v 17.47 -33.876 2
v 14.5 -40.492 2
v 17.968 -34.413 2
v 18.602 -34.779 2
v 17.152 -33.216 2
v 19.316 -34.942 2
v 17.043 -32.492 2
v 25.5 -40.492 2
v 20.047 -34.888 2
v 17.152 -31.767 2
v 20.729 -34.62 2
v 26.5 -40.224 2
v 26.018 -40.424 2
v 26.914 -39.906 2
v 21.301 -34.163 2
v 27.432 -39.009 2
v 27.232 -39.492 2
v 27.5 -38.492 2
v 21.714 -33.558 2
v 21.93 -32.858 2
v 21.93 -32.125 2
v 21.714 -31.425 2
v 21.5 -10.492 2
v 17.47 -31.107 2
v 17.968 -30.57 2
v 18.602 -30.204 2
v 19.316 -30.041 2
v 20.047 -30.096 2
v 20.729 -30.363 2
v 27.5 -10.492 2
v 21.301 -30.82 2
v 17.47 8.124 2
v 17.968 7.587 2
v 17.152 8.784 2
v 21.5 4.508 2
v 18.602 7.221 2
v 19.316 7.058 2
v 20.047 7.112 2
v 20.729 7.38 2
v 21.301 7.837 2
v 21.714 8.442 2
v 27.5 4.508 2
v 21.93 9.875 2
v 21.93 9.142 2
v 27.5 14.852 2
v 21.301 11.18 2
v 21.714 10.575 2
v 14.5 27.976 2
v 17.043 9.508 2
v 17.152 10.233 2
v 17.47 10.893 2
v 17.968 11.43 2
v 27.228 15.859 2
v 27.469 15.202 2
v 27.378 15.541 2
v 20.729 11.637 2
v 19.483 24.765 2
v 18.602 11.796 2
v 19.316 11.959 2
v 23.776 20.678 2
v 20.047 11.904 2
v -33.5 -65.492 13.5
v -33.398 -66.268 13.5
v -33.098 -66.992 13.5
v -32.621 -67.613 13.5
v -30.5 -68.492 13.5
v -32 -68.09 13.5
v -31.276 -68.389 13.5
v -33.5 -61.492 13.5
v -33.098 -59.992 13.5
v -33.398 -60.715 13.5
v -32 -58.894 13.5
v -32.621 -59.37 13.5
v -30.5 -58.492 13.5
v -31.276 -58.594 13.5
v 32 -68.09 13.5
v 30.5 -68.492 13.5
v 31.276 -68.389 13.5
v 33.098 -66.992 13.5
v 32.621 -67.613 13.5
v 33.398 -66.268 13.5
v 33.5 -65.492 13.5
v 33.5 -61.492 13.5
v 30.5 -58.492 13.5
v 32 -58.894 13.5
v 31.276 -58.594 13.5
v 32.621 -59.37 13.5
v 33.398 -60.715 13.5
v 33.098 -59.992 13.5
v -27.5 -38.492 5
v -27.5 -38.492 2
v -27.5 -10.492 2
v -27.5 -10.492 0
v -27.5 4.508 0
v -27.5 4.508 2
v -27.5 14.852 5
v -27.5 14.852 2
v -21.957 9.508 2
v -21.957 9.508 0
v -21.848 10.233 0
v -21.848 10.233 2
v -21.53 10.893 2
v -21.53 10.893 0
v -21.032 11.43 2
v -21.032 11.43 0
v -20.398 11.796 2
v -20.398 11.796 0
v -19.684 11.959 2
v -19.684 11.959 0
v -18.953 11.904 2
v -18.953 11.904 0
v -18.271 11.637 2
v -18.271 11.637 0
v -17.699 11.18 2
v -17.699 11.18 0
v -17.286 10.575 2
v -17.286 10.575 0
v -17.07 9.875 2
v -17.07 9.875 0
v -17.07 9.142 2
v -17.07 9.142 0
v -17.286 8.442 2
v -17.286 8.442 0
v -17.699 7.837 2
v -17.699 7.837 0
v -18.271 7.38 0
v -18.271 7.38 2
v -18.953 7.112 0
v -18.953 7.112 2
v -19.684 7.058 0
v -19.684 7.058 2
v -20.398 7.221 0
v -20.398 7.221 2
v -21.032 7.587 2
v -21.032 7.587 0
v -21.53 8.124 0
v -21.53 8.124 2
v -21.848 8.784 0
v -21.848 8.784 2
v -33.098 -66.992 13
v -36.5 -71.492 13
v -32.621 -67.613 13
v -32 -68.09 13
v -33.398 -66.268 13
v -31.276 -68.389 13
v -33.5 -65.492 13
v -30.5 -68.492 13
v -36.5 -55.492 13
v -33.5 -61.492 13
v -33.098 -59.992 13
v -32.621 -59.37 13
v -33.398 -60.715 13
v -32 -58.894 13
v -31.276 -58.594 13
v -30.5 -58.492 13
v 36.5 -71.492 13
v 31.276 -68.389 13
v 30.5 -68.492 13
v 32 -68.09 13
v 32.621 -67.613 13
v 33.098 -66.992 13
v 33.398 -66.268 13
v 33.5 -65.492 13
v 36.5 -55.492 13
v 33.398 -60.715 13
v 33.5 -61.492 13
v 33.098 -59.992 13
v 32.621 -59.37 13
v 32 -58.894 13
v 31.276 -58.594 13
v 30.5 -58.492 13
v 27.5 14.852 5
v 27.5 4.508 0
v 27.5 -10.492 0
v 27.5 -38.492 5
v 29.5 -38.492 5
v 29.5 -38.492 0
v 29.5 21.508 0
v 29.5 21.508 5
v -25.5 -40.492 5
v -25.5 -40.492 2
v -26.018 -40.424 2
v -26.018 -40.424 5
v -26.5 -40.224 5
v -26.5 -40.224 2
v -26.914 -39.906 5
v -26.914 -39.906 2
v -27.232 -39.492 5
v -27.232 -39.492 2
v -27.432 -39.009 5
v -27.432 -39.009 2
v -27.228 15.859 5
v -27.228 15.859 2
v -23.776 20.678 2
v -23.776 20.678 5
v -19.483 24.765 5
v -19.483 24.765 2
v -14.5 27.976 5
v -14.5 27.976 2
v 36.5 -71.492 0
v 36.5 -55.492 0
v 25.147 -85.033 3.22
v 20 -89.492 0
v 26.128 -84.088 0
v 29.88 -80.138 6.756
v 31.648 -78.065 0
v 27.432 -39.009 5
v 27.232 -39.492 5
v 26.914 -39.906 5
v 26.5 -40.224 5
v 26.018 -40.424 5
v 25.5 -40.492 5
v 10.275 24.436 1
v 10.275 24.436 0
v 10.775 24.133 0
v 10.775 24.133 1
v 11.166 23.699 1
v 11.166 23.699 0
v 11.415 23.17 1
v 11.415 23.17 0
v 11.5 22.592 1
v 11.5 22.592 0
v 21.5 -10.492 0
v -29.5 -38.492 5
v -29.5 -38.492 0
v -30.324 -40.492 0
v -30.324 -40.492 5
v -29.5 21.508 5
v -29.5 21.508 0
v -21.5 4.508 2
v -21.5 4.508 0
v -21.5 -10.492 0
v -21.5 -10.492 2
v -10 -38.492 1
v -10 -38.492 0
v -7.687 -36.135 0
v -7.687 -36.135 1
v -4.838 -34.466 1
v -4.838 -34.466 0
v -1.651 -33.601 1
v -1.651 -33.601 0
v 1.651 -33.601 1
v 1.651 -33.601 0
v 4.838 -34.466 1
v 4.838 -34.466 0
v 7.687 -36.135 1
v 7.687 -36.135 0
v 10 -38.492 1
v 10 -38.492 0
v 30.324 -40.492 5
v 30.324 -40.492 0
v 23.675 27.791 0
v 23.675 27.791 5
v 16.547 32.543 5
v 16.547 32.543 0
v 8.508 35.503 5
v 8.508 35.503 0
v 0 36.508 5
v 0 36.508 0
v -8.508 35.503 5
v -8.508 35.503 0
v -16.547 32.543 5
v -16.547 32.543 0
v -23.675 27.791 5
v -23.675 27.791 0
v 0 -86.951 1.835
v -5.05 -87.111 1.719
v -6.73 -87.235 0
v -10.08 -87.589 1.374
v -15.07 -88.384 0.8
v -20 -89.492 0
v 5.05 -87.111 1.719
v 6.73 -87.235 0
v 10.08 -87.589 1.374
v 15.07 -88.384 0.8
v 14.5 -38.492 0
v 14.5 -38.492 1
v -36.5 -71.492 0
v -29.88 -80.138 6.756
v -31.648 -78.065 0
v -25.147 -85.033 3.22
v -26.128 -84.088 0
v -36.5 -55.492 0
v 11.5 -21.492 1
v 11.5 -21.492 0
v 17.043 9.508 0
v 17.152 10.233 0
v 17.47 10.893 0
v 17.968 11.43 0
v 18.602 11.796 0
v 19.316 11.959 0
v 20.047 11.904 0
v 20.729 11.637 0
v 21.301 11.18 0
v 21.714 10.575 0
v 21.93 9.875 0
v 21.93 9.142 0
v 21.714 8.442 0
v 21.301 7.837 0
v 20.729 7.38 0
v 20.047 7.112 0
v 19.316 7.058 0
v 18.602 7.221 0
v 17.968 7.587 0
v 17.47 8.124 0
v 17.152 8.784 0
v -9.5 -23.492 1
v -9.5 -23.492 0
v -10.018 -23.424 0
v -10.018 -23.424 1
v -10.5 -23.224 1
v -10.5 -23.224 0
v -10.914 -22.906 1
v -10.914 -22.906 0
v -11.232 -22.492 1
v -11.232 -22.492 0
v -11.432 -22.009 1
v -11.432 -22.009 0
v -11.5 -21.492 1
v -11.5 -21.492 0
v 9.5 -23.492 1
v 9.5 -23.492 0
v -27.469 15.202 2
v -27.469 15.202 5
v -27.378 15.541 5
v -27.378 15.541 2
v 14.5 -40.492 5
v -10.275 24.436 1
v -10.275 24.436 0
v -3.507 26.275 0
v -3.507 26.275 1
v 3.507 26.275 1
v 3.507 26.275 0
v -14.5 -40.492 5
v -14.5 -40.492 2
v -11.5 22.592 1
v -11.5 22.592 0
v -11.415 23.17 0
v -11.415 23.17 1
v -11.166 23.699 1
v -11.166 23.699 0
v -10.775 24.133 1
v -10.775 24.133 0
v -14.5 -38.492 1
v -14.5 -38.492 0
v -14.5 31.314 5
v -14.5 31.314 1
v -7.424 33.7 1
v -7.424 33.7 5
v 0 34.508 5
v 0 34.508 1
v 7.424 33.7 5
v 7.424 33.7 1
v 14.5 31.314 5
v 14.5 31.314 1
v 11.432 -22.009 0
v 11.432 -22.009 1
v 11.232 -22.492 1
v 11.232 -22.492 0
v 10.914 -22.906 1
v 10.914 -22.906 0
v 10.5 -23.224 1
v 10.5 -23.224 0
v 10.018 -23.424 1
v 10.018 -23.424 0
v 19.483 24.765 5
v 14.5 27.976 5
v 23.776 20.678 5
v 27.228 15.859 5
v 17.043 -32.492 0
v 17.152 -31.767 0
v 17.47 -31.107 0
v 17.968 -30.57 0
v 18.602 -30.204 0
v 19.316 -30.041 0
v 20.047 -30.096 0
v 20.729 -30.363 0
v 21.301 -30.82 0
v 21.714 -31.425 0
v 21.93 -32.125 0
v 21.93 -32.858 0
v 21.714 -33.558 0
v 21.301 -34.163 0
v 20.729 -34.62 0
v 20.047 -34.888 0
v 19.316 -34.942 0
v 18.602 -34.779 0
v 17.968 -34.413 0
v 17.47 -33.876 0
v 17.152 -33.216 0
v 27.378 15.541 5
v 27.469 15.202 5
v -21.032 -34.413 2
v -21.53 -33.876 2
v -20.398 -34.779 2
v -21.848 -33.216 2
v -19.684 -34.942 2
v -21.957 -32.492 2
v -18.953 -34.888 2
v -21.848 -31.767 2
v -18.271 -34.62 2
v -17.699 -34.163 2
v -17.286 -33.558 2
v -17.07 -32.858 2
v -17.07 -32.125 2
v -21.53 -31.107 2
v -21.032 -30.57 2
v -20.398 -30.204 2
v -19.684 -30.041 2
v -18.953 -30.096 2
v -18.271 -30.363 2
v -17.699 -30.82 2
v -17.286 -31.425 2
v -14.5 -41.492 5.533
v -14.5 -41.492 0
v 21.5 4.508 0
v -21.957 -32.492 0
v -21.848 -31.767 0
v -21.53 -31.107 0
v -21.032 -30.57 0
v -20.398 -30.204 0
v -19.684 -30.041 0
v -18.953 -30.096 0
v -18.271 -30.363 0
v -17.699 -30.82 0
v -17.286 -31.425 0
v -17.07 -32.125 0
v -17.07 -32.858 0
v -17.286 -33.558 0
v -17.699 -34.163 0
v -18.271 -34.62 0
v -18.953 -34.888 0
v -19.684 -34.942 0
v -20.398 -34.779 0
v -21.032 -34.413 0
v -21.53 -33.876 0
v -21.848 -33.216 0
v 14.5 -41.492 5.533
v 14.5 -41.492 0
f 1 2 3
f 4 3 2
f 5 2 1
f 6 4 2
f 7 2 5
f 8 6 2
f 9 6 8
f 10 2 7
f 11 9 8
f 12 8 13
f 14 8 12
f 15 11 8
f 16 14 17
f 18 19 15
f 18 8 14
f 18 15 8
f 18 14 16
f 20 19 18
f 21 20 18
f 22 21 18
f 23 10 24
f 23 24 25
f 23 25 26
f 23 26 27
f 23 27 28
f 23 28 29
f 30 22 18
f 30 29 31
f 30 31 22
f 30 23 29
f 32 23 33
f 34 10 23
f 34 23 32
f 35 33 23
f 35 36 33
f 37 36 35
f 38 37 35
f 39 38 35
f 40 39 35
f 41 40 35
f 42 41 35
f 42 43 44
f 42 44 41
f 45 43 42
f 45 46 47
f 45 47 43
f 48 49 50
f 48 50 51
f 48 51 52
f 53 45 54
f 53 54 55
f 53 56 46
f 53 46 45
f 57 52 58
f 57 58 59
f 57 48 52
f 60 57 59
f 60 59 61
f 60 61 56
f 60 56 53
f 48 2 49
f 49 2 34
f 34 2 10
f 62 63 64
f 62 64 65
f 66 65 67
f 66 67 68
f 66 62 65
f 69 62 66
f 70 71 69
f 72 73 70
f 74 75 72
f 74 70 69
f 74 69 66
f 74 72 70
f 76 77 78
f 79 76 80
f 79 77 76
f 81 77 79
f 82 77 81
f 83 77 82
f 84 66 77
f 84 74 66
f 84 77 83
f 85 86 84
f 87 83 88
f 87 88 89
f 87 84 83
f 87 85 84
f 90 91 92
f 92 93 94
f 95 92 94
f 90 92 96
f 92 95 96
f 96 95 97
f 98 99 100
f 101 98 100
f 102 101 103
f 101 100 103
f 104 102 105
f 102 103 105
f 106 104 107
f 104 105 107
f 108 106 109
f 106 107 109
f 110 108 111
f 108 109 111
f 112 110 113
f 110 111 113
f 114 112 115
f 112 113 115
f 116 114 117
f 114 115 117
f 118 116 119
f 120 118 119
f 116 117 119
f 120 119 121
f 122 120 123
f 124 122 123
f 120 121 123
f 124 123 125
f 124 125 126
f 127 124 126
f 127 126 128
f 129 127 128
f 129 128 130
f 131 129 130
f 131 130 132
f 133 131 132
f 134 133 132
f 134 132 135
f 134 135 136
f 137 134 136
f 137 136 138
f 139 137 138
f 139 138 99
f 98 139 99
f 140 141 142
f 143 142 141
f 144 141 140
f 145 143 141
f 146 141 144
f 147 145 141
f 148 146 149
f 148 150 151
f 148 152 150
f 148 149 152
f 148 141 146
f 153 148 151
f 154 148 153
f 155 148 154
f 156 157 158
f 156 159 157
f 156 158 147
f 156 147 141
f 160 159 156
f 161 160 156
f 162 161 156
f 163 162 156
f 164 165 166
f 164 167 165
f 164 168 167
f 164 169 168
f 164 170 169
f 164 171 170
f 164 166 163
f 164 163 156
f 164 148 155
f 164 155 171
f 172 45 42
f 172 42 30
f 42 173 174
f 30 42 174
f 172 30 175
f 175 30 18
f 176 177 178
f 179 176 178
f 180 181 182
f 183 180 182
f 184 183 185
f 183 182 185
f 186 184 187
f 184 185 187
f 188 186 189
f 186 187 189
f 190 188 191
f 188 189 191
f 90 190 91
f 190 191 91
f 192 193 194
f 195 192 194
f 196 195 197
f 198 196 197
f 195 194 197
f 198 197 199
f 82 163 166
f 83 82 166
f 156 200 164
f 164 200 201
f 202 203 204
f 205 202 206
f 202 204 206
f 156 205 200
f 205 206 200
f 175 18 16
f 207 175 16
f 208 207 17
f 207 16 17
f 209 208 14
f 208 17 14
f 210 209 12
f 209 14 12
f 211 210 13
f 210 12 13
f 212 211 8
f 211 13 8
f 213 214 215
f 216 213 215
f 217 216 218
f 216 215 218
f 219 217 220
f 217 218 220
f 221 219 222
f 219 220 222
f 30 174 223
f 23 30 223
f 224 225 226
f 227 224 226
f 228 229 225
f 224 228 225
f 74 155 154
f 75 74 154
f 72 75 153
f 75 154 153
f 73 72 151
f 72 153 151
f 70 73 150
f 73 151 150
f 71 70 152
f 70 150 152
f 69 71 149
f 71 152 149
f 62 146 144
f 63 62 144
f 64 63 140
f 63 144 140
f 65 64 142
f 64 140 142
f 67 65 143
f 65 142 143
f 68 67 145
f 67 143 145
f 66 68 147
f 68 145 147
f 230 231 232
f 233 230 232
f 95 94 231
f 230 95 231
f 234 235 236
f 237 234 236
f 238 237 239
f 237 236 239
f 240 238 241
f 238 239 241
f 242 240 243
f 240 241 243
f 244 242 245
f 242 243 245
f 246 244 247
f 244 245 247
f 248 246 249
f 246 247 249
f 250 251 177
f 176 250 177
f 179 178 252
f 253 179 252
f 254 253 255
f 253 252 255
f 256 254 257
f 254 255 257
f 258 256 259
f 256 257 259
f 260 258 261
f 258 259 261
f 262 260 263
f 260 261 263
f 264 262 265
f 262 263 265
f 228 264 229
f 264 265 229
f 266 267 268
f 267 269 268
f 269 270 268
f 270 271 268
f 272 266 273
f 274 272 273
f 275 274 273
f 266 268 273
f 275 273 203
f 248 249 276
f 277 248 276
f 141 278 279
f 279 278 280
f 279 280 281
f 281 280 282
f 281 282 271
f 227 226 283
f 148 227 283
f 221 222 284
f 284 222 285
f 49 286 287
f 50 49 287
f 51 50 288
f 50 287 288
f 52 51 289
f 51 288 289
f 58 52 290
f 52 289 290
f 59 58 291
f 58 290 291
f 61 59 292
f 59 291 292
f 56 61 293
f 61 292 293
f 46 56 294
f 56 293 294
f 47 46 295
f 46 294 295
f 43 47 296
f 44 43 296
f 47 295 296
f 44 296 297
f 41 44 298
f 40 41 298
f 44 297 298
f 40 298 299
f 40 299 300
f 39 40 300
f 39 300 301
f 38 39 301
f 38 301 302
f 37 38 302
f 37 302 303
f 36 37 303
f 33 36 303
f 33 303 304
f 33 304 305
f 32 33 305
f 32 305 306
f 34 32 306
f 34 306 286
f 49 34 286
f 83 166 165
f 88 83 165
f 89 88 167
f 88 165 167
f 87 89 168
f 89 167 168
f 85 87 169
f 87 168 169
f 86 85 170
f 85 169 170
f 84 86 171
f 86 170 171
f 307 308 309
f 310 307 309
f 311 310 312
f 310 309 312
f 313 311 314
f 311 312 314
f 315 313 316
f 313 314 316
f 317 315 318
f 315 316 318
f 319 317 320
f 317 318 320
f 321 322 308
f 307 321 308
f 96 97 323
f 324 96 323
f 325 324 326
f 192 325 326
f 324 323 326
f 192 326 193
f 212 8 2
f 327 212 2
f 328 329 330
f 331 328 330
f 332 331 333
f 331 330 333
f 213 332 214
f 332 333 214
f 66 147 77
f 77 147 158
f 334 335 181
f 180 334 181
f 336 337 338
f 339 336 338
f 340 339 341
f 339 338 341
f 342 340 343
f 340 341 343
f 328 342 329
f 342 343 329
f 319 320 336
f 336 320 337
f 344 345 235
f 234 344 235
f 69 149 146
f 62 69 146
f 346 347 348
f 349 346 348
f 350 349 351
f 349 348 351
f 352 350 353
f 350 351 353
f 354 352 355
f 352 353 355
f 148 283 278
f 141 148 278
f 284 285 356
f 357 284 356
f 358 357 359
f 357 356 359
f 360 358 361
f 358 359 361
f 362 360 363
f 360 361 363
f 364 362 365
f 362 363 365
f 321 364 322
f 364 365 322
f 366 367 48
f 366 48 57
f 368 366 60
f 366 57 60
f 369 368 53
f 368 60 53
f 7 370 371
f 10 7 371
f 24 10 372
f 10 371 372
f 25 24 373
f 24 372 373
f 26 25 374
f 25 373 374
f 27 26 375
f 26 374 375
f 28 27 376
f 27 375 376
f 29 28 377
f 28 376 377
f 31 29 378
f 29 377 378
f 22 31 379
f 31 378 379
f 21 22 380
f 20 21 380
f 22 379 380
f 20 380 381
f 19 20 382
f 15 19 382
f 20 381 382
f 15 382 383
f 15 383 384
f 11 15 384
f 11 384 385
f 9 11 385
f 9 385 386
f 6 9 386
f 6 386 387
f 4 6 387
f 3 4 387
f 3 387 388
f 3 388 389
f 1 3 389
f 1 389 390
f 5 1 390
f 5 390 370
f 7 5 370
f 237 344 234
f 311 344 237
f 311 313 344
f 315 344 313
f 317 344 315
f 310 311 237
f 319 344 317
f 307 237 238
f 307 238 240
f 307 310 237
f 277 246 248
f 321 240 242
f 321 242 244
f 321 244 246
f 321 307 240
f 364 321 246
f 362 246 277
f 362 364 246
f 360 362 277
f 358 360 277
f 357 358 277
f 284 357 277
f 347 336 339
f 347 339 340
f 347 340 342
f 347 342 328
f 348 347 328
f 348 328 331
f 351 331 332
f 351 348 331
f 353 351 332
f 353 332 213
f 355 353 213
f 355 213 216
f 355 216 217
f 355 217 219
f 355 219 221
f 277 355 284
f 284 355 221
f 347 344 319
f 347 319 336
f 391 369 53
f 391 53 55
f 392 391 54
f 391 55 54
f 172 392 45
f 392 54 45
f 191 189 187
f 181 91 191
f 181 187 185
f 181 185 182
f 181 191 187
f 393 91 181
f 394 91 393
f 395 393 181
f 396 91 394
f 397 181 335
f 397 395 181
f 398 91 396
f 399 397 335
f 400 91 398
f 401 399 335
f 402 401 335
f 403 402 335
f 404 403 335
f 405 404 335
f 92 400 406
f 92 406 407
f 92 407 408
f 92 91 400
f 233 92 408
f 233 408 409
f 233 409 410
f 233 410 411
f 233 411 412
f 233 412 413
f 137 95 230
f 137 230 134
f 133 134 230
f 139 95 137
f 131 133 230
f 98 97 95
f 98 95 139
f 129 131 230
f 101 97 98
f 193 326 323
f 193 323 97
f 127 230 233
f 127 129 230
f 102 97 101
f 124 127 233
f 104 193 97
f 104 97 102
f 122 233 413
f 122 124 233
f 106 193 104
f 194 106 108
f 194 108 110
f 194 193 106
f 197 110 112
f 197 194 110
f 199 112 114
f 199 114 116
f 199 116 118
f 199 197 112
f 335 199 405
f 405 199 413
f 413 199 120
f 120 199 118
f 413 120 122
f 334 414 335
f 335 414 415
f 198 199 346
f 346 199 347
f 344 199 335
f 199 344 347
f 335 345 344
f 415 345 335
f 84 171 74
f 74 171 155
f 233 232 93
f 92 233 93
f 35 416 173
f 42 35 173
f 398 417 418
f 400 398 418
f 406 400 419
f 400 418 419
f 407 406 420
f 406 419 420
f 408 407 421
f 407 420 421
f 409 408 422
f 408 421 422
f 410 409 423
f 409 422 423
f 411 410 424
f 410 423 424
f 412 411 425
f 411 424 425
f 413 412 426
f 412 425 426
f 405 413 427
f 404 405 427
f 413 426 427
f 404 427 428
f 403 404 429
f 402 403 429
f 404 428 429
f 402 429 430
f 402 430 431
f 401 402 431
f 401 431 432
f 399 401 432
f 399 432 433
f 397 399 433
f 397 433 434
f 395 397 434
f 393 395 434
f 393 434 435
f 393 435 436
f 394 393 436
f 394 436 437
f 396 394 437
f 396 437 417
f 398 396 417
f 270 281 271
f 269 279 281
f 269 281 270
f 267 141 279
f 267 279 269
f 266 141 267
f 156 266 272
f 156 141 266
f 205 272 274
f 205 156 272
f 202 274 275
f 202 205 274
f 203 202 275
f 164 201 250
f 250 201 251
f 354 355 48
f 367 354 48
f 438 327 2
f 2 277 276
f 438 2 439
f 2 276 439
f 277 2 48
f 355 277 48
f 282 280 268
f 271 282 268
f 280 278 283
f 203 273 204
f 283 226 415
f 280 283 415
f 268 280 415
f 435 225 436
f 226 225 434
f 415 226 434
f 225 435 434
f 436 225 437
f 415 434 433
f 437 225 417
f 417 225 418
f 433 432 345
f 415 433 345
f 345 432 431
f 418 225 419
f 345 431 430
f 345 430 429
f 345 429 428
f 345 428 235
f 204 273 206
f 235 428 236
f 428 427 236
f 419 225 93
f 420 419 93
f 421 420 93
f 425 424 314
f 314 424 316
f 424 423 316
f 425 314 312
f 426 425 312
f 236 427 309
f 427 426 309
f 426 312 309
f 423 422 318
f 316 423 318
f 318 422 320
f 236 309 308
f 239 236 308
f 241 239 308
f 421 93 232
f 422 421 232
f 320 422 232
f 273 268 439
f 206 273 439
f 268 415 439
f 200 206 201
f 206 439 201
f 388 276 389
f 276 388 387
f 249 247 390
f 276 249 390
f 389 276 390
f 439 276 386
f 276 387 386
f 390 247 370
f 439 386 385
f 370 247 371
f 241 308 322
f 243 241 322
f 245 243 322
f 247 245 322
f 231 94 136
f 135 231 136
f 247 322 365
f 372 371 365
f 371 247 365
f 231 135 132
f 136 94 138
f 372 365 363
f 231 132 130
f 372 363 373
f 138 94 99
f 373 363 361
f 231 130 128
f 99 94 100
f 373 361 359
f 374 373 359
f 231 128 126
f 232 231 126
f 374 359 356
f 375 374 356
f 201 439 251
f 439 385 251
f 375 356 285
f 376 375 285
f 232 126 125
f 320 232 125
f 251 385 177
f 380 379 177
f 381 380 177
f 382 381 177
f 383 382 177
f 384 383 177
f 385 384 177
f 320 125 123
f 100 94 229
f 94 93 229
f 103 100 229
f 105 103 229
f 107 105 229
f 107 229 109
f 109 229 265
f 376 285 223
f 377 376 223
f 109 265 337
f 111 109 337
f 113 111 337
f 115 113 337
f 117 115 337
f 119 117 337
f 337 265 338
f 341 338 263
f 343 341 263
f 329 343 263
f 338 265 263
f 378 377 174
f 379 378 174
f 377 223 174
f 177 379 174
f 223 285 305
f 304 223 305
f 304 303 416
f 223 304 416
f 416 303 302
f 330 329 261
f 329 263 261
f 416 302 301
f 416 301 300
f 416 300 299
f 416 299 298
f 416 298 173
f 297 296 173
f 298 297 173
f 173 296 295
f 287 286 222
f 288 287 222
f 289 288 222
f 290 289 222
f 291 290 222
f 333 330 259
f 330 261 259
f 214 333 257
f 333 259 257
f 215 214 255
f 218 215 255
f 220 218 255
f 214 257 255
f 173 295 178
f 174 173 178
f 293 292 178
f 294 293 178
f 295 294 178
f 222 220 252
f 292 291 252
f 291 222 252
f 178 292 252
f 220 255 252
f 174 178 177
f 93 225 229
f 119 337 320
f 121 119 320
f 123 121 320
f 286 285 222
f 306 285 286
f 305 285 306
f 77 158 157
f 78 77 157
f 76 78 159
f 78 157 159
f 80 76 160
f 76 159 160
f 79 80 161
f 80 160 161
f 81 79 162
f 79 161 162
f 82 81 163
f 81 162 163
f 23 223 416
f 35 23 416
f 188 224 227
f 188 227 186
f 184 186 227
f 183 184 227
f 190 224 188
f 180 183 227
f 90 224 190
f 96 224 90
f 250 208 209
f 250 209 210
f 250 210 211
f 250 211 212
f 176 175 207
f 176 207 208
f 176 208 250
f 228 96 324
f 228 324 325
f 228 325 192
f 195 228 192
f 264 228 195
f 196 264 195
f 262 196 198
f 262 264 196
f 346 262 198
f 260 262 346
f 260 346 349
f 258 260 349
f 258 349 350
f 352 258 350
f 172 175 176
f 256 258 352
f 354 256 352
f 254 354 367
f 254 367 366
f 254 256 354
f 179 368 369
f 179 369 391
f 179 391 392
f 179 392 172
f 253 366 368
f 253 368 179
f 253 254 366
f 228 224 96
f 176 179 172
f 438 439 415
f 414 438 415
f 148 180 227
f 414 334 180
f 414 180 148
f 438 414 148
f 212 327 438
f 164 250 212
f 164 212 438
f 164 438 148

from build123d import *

# Parameters (mm, degrees)
BOSS_EXTRUDE1_DEPTH            = 1
BOSS_EXTRUDE2_DEPTH            = 2
BOSS_EXTRUDE3_DEPTH            = 5
BOSS_EXTRUDE4_DEPTH            = 13
CUT_EXTRUDE1_REACH             = 99.519
CUT_EXTRUDE1_DIRECTION_2_REACH = 99.519
BOSS_EXTRUDE5_DEPTH            = 0.5
F_10_0_1935_DIAMETER_HOLE1_D   = 4.9149


with BuildPart() as part:
    # Sketch1 → Boss-Extrude1 (new body)
    with BuildSketch(Plane.XY):
        with BuildLine():
            Line((-14.5, 27.975526805), (-14.5, -38.491666667))
            Line((-14.5, -38.491666667), (-10, -38.491666667))
            ThreePointArc((-10, -38.491666667), (0, -33.491666667), (10, -38.491666667))
            Line((10, -38.491666667), (14.5, -38.491666667))
            Line((14.5, -38.491666667), (14.5, 27.975526805))
            Line((14.5, 27.975526805), (14.5, 31.314135298))
            ThreePointArc((14.5, 31.314135298), (0, 34.508333333), (-14.5, 31.314135298))
            Line((-14.5, 31.314135298), (-14.5, 27.975526805))
        make_face()
        with BuildLine():
            Line((-11.5, -21.491666667), (-11.5, 22.592219961))
            ThreePointArc((-11.5, 22.592219961), (-11.165907115, 23.698905773), (-10.275246515, 24.435855728))
            ThreePointArc((-10.275246515, 24.435855728), (0, 26.508333333), (10.275246515, 24.435855728))
            ThreePointArc((10.275246515, 24.435855728), (11.165907115, 23.698905773), (11.5, 22.592219961))
            Line((11.5, 22.592219961), (11.5, -21.491666667))
            ThreePointArc((11.5, -21.491666667), (10.914213562, -22.905880229), (9.5, -23.491666667))
            Line((9.5, -23.491666667), (-9.5, -23.491666667))
            ThreePointArc((-9.5, -23.491666667), (-10.914213562, -22.905880229), (-11.5, -21.491666667))
        make_face(mode=Mode.SUBTRACT)
    extrude(amount=BOSS_EXTRUDE1_DEPTH)

    # Sketch1<3> → Boss-Extrude2 (add)
    with BuildSketch(Plane.XY):
        with BuildLine():
            ThreePointArc((-27.5, -38.491666667), (-26.914213562, -39.905880229), (-25.5, -40.491666667))
            Line((-25.5, -40.491666667), (-14.5, -40.491666667))
            Line((-14.5, -40.491666667), (-14.5, 27.975526805))
            ThreePointArc((-14.5, 27.975526805), (-21.72589695, 22.822477992), (-27.228227719, 15.858868663))
            ThreePointArc((-27.228227719, 15.858868663), (-27.430861911, 15.373593751), (-27.5, 14.85227592))
            Line((-27.5, 14.85227592), (-27.5, 4.508333333))
            Line((-27.5, 4.508333333), (-21.5, 4.508333333))
            Line((-21.5, 4.508333333), (-21.5, -10.491666667))
            Line((-21.5, -10.491666667), (-27.5, -10.491666667))
            Line((-27.5, -10.491666667), (-27.5, -38.491666667))
        make_face()
        with BuildLine():
            Line((14.5, -40.491666667), (25.5, -40.491666667))
            ThreePointArc((25.5, -40.491666667), (26.914213562, -39.905880229), (27.5, -38.491666667))
            Line((27.5, -38.491666667), (27.5, -10.491666667))
            Line((27.5, -10.491666667), (21.5, -10.491666667))
            Line((21.5, -10.491666667), (21.5, 4.508333333))
            Line((21.5, 4.508333333), (27.5, 4.508333333))
            Line((27.5, 4.508333333), (27.5, 14.85227592))
            ThreePointArc((27.5, 14.85227592), (27.430861911, 15.373593751), (27.228227719, 15.858868663))
            ThreePointArc((27.228227719, 15.858868663), (21.72589695, 22.822477992), (14.5, 27.975526805))
            Line((14.5, 27.975526805), (14.5, -40.491666667))
        make_face()
    extrude(amount=BOSS_EXTRUDE2_DEPTH)

    # Sketch1<5> → Boss-Extrude3 (add)
    with BuildSketch(Plane.XY):
        with BuildLine():
            ThreePointArc((29.5, 21.508333333), (0, 36.508333333), (-29.5, 21.508333333))
            Line((-29.5, 21.508333333), (-29.5, -38.491666667))
            Line((-29.5, -38.491666667), (-30.323529412, -40.491666667))
            Line((-30.323529412, -40.491666667), (-25.5, -40.491666667))
            ThreePointArc((-25.5, -40.491666667), (-26.914213562, -39.905880229), (-27.5, -38.491666667))
            Line((-27.5, -38.491666667), (-27.5, -10.491666667))
            Line((-27.5, -10.491666667), (-27.5, 4.508333333))
            Line((-27.5, 4.508333333), (-27.5, 14.85227592))
            ThreePointArc((-27.5, 14.85227592), (-27.430861911, 15.373593751), (-27.228227719, 15.858868663))
            ThreePointArc((-27.228227719, 15.858868663), (-21.72589695, 22.822477992), (-14.5, 27.975526805))
            Line((-14.5, 27.975526805), (-14.5, 31.314135298))
            ThreePointArc((-14.5, 31.314135298), (0, 34.508333333), (14.5, 31.314135298))
            Line((14.5, 31.314135298), (14.5, 27.975526805))
            ThreePointArc((14.5, 27.975526805), (21.72589695, 22.822477992), (27.228227719, 15.858868663))
            ThreePointArc((27.228227719, 15.858868663), (27.430861911, 15.373593751), (27.5, 14.85227592))
            Line((27.5, 14.85227592), (27.5, 4.508333333))
            Line((27.5, 4.508333333), (27.5, -10.491666667))
            Line((27.5, -10.491666667), (27.5, -38.491666667))
            ThreePointArc((27.5, -38.491666667), (26.914213562, -39.905880229), (25.5, -40.491666667))
            Line((25.5, -40.491666667), (30.323529412, -40.491666667))
            Line((30.323529412, -40.491666667), (29.5, -38.491666667))
            Line((29.5, -38.491666667), (29.5, 21.508333333))
        make_face()
    extrude(amount=BOSS_EXTRUDE3_DEPTH)

    # Sketch1<6> → Boss-Extrude4 (add)
    with BuildSketch(Plane.XY):
        with BuildLine():
            Line((-25.5, -40.491666667), (-30.323529412, -40.491666667))
            Line((-30.323529412, -40.491666667), (-36.5, -55.491666667))
            Line((-36.5, -55.491666667), (-36.5, -71.491666667))
            ThreePointArc((-36.5, -71.491666667), (-28.968061706, -81.149889898), (-20, -89.491666667))
            ThreePointArc((-20, -89.491666667), (0, -86.951333591), (20, -89.491666667))
            ThreePointArc((20, -89.491666667), (28.968061706, -81.149889898), (36.5, -71.491666667))
            Line((36.5, -71.491666667), (36.5, -55.491666667))
            Line((36.5, -55.491666667), (30.323529412, -40.491666667))
            Line((30.323529412, -40.491666667), (25.5, -40.491666667))
            Line((25.5, -40.491666667), (14.5, -40.491666667))
            Line((14.5, -40.491666667), (14.5, -41.491666667))
            Line((14.5, -41.491666667), (-14.5, -41.491666667))
            Line((-14.5, -41.491666667), (-14.5, -40.491666667))
            Line((-14.5, -40.491666667), (-25.5, -40.491666667))
        make_face()
    extrude(amount=BOSS_EXTRUDE4_DEPTH)

    # Sketch2 → Cut-Extrude1 (cut, up to next)
    with BuildSketch(Plane(origin=(0, 0, 0), x_dir=(0, 0, -1), z_dir=(1, 0, 0)), mode=Mode.PRIVATE) as cut_extrude1_sk1:
        Polygon((-5, -40.491666667), (-13, -55.491666667), (-13, -40.491666667), align=None)
    cut_extrude1_tool1 = extrude(cut_extrude1_sk1.sketch, amount=-CUT_EXTRUDE1_REACH, mode=Mode.PRIVATE) & part.part
    # Sketch2 → Cut-Extrude1 (cut, up to next)
    with BuildSketch(Plane(origin=(0, 0, 0), x_dir=(0, 0, -1), z_dir=(1, 0, 0)), mode=Mode.PRIVATE) as cut_extrude1_sk2:
        Polygon((-13, -71.491666667), (0, -89.491666667), (-13, -89.491666667), align=None)
    cut_extrude1_tool2 = extrude(cut_extrude1_sk2.sketch, amount=-CUT_EXTRUDE1_REACH, mode=Mode.PRIVATE) & part.part
    add(cut_extrude1_tool1.solids().sort_by_distance((0, -45.491667, 10.333333))[0], mode=Mode.SUBTRACT)
    add(cut_extrude1_tool2.solids().sort_by_distance((0, -83.491667, 8.666667))[0], mode=Mode.SUBTRACT)

    # Sketch2 → Cut-Extrude1 direction 2 (cut, up to next)
    with BuildSketch(Plane(origin=(0, 0, 0), x_dir=(0, 0, -1), z_dir=(1, 0, 0)), mode=Mode.PRIVATE) as cut_extrude1_direction_2_sk1:
        Polygon((-5, -40.491666667), (-13, -55.491666667), (-13, -40.491666667), align=None)
    cut_extrude1_direction_2_tool1 = extrude(cut_extrude1_direction_2_sk1.sketch, amount=CUT_EXTRUDE1_DIRECTION_2_REACH, mode=Mode.PRIVATE) & part.part
    # Sketch2 → Cut-Extrude1 direction 2 (cut, up to next)
    with BuildSketch(Plane(origin=(0, 0, 0), x_dir=(0, 0, -1), z_dir=(1, 0, 0)), mode=Mode.PRIVATE) as cut_extrude1_direction_2_sk2:
        Polygon((-13, -71.491666667), (0, -89.491666667), (-13, -89.491666667), align=None)
    cut_extrude1_direction_2_tool2 = extrude(cut_extrude1_direction_2_sk2.sketch, amount=CUT_EXTRUDE1_DIRECTION_2_REACH, mode=Mode.PRIVATE) & part.part
    add(cut_extrude1_direction_2_tool1.solids().sort_by_distance((0, -45.491667, 10.333333))[0], mode=Mode.SUBTRACT)
    add(cut_extrude1_direction_2_tool2.solids().sort_by_distance((0, -83.491667, 8.666667))[0], mode=Mode.SUBTRACT)

    # Sketch3 → Boss-Extrude5 (add)
    with BuildSketch(Plane.XY.offset(13)):
        with BuildLine():
            Line((-33.5, -61.491666667), (-33.5, -65.491666667))
            ThreePointArc((-33.5, -65.491666667), (-32.621320344, -67.61298701), (-30.5, -68.491666667))
            Line((-30.5, -68.491666667), (30.5, -68.491666667))
            ThreePointArc((30.5, -68.491666667), (32.621320344, -67.61298701), (33.5, -65.491666667))
            Line((33.5, -65.491666667), (33.5, -61.491666667))
            ThreePointArc((33.5, -61.491666667), (32.621320344, -59.370346323), (30.5, -58.491666667))
            Line((30.5, -58.491666667), (-30.5, -58.491666667))
            ThreePointArc((-30.5, -58.491666667), (-32.621320344, -59.370346323), (-33.5, -61.491666667))
        make_face()
    extrude(amount=BOSS_EXTRUDE5_DEPTH)

    # #10 (0.1935) Diameter Hole1 (through all)
    with Locations(Plane.XY.offset(2)):
        with Locations((19.5, -32.491666667), (-19.5, -32.491666667), (-19.5, 9.508333333), (19.5, 9.508333333)):
            Hole(F_10_0_1935_DIAMETER_HOLE1_D / 2)


solid = part.part
